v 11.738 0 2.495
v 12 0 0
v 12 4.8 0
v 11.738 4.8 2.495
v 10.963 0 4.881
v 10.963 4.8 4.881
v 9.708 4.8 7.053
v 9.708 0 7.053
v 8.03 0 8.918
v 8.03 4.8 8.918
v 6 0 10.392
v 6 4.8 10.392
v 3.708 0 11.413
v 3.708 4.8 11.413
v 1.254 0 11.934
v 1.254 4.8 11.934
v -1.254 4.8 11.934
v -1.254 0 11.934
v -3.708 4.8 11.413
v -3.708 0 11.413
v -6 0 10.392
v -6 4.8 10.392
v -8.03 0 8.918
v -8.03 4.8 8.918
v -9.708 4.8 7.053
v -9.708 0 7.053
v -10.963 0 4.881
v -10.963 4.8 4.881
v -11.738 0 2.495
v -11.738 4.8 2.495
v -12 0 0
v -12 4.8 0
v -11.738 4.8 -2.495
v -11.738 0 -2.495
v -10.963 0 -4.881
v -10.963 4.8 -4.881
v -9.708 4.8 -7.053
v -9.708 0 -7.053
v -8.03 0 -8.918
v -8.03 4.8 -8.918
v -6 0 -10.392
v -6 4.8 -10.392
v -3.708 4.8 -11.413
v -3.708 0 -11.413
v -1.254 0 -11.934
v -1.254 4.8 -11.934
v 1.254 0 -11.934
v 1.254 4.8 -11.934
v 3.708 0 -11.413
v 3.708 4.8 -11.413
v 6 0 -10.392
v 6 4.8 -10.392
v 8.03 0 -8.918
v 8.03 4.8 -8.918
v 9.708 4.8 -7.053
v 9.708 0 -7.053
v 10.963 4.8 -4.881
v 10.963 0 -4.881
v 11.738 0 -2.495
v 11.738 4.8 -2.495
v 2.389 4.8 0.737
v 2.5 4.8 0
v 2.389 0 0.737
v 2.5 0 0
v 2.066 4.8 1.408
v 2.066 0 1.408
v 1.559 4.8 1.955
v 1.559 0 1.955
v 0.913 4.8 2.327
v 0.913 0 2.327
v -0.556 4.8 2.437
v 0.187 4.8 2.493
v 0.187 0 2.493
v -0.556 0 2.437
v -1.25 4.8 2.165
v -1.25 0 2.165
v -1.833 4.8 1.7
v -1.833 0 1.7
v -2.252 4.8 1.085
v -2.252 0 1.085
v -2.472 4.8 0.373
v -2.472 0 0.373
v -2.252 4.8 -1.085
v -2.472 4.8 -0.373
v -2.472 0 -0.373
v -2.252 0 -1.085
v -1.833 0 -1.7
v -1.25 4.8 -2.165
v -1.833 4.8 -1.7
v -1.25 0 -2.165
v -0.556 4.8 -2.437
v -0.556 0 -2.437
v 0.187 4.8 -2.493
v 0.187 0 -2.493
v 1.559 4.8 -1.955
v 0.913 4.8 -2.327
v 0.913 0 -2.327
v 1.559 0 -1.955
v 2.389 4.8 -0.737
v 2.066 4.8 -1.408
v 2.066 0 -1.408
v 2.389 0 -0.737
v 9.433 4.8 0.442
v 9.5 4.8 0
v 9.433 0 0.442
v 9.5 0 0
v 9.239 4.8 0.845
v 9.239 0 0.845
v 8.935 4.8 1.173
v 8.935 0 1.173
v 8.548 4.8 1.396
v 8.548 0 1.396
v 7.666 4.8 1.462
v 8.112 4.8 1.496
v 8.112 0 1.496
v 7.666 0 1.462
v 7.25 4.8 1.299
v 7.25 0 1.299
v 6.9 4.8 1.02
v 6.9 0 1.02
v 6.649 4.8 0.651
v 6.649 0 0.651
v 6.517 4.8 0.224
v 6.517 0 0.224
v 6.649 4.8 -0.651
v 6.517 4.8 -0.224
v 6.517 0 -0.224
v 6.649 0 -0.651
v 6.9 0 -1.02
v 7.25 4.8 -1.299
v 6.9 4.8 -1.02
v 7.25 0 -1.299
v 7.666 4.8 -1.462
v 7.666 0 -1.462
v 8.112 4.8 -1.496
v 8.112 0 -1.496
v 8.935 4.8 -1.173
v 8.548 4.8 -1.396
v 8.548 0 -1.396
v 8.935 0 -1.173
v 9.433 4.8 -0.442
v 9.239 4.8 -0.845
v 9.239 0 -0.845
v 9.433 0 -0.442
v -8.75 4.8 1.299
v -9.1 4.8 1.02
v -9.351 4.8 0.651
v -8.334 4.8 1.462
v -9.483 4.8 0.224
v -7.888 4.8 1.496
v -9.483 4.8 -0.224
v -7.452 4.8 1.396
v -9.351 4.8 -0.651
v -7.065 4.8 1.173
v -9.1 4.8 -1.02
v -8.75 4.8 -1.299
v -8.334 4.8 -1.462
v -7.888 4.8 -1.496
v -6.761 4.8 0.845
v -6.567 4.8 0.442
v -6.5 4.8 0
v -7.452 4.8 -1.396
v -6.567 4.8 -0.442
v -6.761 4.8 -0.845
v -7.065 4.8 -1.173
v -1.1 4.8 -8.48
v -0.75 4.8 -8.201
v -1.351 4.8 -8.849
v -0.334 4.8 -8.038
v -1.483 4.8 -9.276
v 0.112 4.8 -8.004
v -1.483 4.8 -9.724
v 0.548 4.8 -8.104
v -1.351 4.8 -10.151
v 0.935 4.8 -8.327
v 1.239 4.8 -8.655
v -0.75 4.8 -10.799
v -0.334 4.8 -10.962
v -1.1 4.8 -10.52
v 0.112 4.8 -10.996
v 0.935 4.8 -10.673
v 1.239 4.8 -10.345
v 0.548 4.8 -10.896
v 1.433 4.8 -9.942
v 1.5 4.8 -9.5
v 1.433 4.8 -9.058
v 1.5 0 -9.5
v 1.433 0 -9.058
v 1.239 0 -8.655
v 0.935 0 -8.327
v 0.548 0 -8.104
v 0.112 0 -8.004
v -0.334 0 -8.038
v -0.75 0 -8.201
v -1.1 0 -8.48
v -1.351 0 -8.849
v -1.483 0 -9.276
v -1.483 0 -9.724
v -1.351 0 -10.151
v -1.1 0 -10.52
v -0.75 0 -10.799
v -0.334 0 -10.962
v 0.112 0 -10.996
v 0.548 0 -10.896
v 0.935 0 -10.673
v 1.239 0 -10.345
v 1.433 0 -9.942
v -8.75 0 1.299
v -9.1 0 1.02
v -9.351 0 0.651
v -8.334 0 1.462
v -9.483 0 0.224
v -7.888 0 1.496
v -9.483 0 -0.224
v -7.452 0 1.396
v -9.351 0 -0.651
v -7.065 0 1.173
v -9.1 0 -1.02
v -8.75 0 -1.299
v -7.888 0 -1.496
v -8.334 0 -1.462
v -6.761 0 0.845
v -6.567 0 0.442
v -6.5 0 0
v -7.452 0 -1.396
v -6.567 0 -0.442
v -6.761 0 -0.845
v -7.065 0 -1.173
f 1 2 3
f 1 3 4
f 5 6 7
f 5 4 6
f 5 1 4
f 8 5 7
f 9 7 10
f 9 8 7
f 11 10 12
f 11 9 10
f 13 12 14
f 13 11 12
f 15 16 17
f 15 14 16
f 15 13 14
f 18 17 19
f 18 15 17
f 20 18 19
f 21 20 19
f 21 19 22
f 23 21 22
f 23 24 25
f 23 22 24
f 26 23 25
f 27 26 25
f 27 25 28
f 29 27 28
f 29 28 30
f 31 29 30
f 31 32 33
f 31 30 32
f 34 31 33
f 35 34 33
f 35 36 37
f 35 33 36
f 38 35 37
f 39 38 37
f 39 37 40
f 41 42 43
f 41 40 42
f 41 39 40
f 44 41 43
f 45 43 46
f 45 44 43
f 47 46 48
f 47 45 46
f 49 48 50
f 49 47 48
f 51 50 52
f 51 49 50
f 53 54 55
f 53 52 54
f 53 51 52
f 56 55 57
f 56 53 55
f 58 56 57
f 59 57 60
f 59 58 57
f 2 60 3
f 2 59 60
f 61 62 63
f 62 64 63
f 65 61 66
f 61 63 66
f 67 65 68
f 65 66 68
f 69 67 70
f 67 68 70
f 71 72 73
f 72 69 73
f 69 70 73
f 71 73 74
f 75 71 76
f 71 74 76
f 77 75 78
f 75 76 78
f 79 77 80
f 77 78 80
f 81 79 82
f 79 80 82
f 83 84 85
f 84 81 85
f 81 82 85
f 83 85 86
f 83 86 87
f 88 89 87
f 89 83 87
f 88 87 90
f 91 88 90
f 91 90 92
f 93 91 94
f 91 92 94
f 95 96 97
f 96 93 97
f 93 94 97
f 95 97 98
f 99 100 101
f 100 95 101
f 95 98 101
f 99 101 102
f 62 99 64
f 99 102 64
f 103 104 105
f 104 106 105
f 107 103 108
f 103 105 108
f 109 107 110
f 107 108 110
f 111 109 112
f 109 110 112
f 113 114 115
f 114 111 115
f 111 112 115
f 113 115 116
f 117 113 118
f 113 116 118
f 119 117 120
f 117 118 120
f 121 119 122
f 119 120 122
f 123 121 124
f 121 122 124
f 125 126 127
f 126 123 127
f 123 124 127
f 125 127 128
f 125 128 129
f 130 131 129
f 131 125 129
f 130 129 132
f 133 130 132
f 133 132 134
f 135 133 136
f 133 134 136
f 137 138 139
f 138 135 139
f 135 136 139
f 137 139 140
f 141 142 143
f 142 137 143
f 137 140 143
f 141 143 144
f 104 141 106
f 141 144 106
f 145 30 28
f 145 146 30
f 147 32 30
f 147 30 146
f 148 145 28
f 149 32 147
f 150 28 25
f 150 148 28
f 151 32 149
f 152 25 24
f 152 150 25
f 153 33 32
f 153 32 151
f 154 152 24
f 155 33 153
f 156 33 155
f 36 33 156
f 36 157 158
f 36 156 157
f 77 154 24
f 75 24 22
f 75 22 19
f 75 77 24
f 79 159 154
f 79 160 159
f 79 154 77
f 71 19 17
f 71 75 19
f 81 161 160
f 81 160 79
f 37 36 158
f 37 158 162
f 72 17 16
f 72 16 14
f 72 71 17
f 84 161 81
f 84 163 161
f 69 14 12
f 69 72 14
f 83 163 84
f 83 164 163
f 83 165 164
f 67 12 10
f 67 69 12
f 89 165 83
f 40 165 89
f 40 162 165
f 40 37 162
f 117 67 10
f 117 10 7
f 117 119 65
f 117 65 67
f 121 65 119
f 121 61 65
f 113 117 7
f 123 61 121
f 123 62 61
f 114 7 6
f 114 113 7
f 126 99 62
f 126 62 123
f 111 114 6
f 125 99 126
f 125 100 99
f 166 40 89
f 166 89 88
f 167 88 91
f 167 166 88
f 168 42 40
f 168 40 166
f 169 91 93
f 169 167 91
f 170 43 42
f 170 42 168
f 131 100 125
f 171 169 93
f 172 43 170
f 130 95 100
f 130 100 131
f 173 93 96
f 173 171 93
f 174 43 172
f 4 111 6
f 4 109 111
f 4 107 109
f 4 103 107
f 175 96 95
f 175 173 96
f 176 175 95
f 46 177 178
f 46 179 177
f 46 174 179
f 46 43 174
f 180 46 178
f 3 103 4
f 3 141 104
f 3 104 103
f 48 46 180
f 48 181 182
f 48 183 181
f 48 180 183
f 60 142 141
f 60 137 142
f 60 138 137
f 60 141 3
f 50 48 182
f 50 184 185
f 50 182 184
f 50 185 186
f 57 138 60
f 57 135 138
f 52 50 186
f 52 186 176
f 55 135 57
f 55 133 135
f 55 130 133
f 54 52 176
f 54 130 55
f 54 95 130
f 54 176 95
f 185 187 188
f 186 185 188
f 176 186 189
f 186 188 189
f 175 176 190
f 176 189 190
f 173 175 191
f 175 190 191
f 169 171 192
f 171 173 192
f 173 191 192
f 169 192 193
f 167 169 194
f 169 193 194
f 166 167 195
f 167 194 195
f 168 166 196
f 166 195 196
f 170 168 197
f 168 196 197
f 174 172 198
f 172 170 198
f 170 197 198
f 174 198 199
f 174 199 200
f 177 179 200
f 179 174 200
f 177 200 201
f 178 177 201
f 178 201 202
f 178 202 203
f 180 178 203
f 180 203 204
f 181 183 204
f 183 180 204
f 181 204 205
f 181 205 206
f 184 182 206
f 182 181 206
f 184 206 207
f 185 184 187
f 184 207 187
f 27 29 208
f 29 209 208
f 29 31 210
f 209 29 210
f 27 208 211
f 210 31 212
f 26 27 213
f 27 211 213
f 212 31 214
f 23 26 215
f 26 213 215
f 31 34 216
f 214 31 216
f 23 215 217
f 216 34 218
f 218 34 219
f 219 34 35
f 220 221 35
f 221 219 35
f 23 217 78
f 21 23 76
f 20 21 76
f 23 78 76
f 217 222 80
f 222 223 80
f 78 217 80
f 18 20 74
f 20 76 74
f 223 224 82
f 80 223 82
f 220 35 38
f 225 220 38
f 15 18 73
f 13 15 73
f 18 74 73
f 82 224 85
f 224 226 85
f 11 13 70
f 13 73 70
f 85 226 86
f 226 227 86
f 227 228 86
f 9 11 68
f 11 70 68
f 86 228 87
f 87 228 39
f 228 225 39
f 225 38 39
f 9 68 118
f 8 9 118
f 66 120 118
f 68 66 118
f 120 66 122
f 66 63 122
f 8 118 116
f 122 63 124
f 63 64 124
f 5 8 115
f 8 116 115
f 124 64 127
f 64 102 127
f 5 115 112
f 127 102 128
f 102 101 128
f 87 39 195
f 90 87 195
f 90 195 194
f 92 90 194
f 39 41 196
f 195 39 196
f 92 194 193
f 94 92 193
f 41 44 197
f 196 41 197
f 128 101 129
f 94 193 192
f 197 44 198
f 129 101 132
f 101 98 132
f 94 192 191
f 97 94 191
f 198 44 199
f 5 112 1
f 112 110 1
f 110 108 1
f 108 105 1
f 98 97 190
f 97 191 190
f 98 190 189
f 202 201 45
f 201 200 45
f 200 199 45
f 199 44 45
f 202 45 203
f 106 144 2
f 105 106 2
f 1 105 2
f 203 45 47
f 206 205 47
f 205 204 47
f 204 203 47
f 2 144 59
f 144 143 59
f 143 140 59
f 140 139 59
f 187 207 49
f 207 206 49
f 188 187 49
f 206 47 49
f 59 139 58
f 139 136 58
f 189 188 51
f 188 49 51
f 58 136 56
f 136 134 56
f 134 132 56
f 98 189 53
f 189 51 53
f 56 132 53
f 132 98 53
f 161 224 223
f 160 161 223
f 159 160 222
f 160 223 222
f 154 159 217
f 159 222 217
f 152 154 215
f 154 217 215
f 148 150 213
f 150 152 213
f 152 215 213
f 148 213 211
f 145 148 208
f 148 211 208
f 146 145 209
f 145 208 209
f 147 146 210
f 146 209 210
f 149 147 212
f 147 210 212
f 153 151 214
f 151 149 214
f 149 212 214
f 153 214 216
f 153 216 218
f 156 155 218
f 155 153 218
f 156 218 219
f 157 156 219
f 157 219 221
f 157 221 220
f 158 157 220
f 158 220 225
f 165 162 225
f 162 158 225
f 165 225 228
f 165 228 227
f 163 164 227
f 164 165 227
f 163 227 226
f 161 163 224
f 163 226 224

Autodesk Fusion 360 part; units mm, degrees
sketch "Sketch1" plane through (0, 0, 0) normal (0, 1, 0) x (1, 0, 0)
  circle A0 centre (0, 0) radius 12
  circle A1 centre (0, 0) radius 9.5 construction
  circle A2 centre (0, 0) radius 8 construction
  line L0 (0, 0) -> (0, -9.5) construction
  line L1 (0, 0) -> (0, 9.5) construction
  line L2 (0, 0) -> (8, 0) construction
  line L3 (0, 0) -> (-8, 0) construction
  circle A3 centre (0, 9.5) radius 1.5
  circle A4 centre (8, 0) radius 1.5
  circle A5 centre (-8, 0) radius 1.5
  circle A6 centre (0, 0) radius 2.5
  dimension "d1" = 24
  dimension "d2" = 19
  dimension "d3" = 16
  dimension "d5" = 3
  dimension "d6" = 3
  dimension "d7" = 3
  dimension "d10" = 5
extrude "Extrude1" add sketch "Sketch1" along normal blind 4.8
